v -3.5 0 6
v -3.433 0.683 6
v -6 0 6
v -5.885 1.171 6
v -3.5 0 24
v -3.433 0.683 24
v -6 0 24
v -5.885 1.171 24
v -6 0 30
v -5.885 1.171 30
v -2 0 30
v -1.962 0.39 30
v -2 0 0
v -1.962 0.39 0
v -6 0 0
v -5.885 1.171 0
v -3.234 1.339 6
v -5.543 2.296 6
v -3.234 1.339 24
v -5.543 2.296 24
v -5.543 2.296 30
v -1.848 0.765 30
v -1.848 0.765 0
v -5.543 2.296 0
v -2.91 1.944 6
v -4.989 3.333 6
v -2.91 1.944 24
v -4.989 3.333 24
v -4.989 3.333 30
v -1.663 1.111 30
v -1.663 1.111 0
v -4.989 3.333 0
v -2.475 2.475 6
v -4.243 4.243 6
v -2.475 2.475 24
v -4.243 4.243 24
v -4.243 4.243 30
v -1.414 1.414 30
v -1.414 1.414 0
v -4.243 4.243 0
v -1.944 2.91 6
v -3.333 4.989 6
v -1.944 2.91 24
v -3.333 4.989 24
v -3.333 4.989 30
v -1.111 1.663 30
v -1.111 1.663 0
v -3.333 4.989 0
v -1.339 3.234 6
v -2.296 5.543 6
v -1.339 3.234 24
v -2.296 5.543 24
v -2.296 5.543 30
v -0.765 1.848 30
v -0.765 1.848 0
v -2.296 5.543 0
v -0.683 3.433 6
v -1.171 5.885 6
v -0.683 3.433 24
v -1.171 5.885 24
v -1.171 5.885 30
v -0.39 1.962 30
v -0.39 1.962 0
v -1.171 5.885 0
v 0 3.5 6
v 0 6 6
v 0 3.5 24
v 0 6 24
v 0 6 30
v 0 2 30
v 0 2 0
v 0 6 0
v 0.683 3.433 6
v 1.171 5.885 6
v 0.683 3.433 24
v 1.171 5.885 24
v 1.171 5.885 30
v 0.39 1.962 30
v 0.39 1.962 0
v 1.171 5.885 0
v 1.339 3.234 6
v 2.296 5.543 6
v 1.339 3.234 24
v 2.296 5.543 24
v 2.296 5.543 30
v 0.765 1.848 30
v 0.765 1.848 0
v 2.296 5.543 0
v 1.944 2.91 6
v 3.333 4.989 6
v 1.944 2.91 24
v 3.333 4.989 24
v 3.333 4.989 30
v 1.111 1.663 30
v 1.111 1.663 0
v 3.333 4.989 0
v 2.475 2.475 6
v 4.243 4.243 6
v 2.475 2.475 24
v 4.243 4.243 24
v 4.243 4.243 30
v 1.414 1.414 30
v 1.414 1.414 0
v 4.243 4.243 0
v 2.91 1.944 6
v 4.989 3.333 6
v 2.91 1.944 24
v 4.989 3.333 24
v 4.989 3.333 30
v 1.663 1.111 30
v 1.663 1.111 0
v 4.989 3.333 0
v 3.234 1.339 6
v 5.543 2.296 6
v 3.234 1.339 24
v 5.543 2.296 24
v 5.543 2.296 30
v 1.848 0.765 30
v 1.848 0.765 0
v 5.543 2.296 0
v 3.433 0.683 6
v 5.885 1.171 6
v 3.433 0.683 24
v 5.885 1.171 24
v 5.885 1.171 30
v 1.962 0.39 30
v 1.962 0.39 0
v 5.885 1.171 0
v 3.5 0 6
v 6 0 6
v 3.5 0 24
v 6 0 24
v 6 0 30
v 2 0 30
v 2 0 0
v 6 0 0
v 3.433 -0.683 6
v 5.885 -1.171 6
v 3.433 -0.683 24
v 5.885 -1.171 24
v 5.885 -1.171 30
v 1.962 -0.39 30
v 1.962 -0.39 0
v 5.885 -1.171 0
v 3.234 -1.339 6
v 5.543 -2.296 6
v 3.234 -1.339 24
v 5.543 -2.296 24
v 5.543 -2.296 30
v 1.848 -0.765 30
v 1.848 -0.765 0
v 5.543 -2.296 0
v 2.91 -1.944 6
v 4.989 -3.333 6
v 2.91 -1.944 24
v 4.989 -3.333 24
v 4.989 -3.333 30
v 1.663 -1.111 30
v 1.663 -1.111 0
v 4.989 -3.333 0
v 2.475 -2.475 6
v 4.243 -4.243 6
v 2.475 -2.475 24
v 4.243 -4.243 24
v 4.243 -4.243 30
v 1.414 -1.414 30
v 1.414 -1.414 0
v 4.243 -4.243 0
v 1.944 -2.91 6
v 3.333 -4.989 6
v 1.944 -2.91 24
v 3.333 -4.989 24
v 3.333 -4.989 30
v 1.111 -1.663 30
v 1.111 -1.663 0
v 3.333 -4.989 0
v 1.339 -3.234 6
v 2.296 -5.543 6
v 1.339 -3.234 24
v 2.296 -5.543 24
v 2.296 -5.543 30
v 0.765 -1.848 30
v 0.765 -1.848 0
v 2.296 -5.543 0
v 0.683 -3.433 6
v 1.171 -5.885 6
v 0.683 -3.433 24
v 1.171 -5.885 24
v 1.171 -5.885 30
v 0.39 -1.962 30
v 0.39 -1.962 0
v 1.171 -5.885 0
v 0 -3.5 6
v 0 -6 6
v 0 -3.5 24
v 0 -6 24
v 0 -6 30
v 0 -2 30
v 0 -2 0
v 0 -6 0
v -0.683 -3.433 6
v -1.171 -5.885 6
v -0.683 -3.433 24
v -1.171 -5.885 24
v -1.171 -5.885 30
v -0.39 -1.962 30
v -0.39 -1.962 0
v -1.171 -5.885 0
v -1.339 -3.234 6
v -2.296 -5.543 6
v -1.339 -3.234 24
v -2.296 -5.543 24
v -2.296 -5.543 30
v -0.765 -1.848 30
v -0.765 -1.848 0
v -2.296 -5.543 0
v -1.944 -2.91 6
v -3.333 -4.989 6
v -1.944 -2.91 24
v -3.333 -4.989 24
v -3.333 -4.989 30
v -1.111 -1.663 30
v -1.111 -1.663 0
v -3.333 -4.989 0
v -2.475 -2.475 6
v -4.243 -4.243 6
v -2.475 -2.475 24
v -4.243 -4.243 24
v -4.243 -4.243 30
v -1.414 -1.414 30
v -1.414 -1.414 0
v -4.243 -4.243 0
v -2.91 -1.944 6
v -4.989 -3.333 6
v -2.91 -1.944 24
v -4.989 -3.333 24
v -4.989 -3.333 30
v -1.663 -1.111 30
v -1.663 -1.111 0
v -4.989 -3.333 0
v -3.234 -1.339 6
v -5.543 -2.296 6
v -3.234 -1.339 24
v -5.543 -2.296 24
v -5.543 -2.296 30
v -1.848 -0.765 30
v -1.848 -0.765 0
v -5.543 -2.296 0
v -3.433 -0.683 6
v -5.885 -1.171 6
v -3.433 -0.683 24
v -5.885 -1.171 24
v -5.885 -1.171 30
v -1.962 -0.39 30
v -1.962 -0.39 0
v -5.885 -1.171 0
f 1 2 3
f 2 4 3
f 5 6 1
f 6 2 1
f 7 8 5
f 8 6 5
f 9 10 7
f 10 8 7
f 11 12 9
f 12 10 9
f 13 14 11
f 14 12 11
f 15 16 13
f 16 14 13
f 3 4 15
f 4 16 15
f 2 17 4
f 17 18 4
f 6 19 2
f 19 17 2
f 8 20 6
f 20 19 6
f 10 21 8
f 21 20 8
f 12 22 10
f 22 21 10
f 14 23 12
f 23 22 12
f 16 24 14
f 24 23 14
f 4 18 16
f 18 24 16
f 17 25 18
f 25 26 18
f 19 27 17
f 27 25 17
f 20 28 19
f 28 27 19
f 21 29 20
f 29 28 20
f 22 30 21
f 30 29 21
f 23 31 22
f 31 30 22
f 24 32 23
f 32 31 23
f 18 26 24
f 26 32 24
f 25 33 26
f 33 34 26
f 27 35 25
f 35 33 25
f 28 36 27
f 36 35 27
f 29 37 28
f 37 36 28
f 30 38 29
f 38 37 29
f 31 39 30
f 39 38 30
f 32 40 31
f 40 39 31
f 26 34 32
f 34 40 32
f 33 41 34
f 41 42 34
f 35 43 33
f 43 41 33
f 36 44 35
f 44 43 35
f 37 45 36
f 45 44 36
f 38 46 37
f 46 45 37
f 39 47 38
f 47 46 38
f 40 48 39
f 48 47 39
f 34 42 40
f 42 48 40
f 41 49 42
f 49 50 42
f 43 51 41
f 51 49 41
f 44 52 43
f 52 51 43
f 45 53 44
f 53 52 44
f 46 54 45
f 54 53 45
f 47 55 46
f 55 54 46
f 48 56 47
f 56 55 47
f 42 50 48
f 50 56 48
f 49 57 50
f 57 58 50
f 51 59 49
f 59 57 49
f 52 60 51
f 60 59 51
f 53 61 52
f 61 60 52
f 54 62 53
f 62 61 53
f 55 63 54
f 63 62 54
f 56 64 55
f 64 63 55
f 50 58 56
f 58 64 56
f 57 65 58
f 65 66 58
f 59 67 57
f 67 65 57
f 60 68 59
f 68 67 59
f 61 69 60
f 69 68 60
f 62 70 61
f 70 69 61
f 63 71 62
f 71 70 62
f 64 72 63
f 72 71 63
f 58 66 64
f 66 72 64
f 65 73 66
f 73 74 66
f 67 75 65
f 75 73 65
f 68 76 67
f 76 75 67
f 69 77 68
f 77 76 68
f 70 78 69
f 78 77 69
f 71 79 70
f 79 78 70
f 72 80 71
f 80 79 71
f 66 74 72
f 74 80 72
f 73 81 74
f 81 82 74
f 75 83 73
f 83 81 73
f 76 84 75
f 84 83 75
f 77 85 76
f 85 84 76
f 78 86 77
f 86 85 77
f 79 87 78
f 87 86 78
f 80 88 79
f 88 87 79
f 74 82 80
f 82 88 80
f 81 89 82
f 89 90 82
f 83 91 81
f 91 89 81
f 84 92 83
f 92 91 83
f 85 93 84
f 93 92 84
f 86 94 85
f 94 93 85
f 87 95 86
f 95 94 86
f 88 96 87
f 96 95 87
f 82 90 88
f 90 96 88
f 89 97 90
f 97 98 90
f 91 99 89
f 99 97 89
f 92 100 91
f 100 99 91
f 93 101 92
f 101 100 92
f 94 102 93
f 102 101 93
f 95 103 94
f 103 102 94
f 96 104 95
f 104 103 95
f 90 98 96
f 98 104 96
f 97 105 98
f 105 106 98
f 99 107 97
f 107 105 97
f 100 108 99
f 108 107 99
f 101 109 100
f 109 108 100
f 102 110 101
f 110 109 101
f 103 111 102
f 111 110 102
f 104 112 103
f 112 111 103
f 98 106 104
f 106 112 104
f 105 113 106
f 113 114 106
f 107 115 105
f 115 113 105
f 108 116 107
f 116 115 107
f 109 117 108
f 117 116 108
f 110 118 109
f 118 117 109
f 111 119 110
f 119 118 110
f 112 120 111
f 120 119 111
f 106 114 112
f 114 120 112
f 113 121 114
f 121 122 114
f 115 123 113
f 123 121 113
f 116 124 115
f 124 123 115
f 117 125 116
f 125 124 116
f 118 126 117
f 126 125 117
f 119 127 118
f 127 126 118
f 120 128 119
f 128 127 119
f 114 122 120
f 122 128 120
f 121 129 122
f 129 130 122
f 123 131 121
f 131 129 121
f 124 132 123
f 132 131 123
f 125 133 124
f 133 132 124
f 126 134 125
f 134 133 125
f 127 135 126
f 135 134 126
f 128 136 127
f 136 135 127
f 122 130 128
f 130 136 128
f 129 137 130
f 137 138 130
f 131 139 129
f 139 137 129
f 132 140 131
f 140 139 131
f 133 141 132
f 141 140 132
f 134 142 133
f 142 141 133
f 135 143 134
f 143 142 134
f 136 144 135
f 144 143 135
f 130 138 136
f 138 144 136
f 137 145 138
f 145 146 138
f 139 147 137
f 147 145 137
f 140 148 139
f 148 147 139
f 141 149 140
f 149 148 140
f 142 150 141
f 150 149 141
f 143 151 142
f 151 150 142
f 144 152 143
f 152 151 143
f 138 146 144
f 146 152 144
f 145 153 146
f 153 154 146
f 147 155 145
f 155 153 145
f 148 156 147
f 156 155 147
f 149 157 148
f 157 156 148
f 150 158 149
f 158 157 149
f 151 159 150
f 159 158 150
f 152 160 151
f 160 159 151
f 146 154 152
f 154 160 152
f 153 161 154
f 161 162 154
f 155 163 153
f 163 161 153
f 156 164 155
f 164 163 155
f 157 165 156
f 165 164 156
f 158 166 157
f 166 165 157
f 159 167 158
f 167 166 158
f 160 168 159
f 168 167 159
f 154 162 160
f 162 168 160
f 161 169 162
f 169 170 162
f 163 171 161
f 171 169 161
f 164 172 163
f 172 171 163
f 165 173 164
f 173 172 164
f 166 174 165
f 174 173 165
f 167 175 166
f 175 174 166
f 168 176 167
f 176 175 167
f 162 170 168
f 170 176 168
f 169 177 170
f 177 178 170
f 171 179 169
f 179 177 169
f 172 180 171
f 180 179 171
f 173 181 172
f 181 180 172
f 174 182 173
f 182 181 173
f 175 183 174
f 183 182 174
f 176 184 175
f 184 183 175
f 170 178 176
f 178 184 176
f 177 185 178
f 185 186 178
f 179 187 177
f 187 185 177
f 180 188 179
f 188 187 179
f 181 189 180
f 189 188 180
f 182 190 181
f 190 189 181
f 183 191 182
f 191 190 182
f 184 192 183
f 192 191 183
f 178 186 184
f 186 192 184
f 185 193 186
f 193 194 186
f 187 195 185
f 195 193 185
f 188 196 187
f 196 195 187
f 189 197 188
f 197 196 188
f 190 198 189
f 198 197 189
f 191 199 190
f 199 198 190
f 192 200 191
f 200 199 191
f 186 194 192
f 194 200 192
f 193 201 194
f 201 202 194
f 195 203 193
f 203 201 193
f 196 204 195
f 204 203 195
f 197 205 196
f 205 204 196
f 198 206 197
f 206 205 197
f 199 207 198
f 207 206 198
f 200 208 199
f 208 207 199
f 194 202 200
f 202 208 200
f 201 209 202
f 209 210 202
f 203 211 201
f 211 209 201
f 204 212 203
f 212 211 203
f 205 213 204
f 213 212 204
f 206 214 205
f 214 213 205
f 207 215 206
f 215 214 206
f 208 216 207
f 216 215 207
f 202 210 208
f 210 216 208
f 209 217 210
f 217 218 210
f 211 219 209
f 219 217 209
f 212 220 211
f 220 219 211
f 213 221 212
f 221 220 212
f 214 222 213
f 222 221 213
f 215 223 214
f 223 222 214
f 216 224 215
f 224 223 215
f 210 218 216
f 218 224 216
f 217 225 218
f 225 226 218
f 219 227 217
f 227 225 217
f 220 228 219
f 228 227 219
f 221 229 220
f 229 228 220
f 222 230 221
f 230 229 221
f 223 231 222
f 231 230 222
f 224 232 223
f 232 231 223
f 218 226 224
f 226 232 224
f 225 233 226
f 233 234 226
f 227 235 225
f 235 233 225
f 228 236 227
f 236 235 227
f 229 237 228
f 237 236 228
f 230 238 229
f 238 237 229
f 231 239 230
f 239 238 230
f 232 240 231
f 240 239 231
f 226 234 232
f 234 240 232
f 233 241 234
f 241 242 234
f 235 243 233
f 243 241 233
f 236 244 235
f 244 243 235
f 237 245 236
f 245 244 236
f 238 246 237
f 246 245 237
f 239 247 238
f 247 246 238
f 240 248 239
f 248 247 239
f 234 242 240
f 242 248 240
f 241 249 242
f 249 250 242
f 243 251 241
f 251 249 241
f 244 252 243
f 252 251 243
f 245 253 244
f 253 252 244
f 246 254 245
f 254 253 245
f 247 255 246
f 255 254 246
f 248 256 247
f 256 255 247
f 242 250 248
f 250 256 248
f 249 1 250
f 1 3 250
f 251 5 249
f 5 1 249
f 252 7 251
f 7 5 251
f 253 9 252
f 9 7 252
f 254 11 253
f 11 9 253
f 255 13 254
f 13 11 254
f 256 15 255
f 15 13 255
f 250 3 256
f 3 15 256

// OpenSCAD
$fn = 32;

// ----------------------------------------------------------------------
// Profiled standoff: spool spacer, 30 mm long, bore 4 mm
// ----------------------------------------------------------------------

// --- parameters (mm) ---
revolve_angle = 360;      // full turn around the Z axis
profile_points = 8;       // points of the closed outline

profile = [[2, 0], [6, 0], [6, 6], [3.5, 6], [3.5, 24], [6, 24], [6, 30], [2, 30]];  // single closed polygon, 8 points, counter clockwise

// --- the one profile operation ---
rotate_extrude(angle = revolve_angle) polygon(points = profile);
